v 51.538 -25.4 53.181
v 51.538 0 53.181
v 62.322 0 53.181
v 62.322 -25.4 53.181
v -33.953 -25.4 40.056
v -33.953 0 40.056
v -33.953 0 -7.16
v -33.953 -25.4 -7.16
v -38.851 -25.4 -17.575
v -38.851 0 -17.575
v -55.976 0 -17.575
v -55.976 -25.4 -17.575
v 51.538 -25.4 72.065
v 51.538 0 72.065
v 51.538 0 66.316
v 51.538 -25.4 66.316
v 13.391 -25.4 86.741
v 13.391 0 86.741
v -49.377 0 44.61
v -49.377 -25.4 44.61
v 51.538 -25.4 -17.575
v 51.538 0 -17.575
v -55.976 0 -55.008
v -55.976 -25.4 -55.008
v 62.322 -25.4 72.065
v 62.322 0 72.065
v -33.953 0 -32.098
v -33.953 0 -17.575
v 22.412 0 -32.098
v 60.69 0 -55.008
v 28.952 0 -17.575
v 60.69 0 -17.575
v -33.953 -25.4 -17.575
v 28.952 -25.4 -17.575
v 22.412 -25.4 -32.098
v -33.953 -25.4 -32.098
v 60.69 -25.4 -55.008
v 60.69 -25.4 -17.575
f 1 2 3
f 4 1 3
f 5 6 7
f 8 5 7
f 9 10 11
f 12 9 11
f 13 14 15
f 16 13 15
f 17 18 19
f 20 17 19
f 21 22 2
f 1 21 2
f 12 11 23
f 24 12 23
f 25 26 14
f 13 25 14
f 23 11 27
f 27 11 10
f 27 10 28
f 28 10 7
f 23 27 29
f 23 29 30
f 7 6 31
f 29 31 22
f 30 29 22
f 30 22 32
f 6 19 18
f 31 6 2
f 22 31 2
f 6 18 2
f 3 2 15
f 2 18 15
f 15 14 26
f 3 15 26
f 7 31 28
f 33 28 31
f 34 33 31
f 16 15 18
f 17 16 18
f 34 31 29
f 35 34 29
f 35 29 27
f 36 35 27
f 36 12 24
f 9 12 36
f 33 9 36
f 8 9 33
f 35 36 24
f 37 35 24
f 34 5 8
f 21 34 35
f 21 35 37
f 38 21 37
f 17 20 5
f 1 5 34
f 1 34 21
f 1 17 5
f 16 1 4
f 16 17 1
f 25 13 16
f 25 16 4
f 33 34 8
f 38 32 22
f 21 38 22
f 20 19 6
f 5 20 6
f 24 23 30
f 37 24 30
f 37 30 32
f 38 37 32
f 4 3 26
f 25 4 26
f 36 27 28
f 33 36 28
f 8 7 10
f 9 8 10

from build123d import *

# Parameters (mm, degrees)
F1_DEPTH = 25.4


with BuildPart() as f1:
    # F0 (on Front) → F1 (new body)
    with BuildSketch(Plane.XZ):
        Polygon((-33.9528769255, 40.0564680563), (-33.9528769255, 53.1810894608), (18.2133984662, 53.1810894608), (51.5383630991, 65.2996533445), (51.5383630991, 66.3159769478), (13.3911538869, 86.7411494255), (-49.376770854, 44.6101650596), align=None)
        Polygon((18.2133984662, 53.1810894608), (-33.9528769255, 53.1810894608), (-33.9528769255, 40.0564680563), (-15.8423800021, 34.7095876932), (-14.4241497444, 34.3657573582), (45.7716546953, 19.7721160948), (28.9523048901, -17.5747666508), (51.5383630991, -17.5747666508), (51.5383630991, 53.1810894608), align=None)
        Polygon((51.5383630991, 65.2996533445), (18.2133984662, 53.1810894608), (51.5383630991, 53.1810894608), align=None)
        Polygon((-15.8423800021, 34.7095876932), (-33.9528769255, 40.0564680563), (-33.9528769255, -7.1603319994), (-14.4241497444, 34.3657573582), align=None)
        Polygon((51.5383630991, 65.2996533445), (51.5383630991, 53.1810894608), (62.3221695423, 53.1810894608), (62.3221695423, 72.0649734139), (51.5383630991, 72.0649734139), (51.5383630991, 66.3159769478), (52.6687689126, 65.7107234001), align=None)
        Polygon((51.5383630991, 66.3159769478), (51.5383630991, 65.2996533445), (52.6687689126, 65.7107234001), align=None)
        Polygon((-14.4241497444, 34.3657573582), (-33.9528769255, -7.1603319994), (-33.9528769255, -17.5747666508), (28.9523048901, -17.5747666508), (45.7716546953, 19.7721160948), align=None)
        Polygon((-33.9528769255, -17.5747666508), (-33.9528769255, -7.1603319994), (-38.8505365943, -17.5747666508), align=None)
        Polygon((60.6898404658, -17.5747666508), (51.5383630991, -17.5747666508), (51.5383630991, -32.0976935327), (22.4118343216, -32.0976935327), (15.7569888979, -46.8745864928), (-47.0071732998, -34.9191240966), (-38.8505365943, -17.5747666508), (-55.9755302966, -17.5747666508), (-55.9755302966, -55.0077706575), (60.6898404658, -55.0077706575), align=None)
        Polygon((51.5383630991, -32.0976935327), (51.5383630991, -17.5747666508), (28.9523048901, -17.5747666508), (22.4118343216, -32.0976935327), align=None)
        Polygon((-33.9528769255, -32.0976935327), (-33.9528769255, -17.5747666508), (-38.8505365943, -17.5747666508), (-47.0071732998, -34.9191240966), (15.7569888979, -46.8745864928), (22.4118343216, -32.0976935327), align=None)
    extrude(amount=F1_DEPTH)


solid = f1.part
